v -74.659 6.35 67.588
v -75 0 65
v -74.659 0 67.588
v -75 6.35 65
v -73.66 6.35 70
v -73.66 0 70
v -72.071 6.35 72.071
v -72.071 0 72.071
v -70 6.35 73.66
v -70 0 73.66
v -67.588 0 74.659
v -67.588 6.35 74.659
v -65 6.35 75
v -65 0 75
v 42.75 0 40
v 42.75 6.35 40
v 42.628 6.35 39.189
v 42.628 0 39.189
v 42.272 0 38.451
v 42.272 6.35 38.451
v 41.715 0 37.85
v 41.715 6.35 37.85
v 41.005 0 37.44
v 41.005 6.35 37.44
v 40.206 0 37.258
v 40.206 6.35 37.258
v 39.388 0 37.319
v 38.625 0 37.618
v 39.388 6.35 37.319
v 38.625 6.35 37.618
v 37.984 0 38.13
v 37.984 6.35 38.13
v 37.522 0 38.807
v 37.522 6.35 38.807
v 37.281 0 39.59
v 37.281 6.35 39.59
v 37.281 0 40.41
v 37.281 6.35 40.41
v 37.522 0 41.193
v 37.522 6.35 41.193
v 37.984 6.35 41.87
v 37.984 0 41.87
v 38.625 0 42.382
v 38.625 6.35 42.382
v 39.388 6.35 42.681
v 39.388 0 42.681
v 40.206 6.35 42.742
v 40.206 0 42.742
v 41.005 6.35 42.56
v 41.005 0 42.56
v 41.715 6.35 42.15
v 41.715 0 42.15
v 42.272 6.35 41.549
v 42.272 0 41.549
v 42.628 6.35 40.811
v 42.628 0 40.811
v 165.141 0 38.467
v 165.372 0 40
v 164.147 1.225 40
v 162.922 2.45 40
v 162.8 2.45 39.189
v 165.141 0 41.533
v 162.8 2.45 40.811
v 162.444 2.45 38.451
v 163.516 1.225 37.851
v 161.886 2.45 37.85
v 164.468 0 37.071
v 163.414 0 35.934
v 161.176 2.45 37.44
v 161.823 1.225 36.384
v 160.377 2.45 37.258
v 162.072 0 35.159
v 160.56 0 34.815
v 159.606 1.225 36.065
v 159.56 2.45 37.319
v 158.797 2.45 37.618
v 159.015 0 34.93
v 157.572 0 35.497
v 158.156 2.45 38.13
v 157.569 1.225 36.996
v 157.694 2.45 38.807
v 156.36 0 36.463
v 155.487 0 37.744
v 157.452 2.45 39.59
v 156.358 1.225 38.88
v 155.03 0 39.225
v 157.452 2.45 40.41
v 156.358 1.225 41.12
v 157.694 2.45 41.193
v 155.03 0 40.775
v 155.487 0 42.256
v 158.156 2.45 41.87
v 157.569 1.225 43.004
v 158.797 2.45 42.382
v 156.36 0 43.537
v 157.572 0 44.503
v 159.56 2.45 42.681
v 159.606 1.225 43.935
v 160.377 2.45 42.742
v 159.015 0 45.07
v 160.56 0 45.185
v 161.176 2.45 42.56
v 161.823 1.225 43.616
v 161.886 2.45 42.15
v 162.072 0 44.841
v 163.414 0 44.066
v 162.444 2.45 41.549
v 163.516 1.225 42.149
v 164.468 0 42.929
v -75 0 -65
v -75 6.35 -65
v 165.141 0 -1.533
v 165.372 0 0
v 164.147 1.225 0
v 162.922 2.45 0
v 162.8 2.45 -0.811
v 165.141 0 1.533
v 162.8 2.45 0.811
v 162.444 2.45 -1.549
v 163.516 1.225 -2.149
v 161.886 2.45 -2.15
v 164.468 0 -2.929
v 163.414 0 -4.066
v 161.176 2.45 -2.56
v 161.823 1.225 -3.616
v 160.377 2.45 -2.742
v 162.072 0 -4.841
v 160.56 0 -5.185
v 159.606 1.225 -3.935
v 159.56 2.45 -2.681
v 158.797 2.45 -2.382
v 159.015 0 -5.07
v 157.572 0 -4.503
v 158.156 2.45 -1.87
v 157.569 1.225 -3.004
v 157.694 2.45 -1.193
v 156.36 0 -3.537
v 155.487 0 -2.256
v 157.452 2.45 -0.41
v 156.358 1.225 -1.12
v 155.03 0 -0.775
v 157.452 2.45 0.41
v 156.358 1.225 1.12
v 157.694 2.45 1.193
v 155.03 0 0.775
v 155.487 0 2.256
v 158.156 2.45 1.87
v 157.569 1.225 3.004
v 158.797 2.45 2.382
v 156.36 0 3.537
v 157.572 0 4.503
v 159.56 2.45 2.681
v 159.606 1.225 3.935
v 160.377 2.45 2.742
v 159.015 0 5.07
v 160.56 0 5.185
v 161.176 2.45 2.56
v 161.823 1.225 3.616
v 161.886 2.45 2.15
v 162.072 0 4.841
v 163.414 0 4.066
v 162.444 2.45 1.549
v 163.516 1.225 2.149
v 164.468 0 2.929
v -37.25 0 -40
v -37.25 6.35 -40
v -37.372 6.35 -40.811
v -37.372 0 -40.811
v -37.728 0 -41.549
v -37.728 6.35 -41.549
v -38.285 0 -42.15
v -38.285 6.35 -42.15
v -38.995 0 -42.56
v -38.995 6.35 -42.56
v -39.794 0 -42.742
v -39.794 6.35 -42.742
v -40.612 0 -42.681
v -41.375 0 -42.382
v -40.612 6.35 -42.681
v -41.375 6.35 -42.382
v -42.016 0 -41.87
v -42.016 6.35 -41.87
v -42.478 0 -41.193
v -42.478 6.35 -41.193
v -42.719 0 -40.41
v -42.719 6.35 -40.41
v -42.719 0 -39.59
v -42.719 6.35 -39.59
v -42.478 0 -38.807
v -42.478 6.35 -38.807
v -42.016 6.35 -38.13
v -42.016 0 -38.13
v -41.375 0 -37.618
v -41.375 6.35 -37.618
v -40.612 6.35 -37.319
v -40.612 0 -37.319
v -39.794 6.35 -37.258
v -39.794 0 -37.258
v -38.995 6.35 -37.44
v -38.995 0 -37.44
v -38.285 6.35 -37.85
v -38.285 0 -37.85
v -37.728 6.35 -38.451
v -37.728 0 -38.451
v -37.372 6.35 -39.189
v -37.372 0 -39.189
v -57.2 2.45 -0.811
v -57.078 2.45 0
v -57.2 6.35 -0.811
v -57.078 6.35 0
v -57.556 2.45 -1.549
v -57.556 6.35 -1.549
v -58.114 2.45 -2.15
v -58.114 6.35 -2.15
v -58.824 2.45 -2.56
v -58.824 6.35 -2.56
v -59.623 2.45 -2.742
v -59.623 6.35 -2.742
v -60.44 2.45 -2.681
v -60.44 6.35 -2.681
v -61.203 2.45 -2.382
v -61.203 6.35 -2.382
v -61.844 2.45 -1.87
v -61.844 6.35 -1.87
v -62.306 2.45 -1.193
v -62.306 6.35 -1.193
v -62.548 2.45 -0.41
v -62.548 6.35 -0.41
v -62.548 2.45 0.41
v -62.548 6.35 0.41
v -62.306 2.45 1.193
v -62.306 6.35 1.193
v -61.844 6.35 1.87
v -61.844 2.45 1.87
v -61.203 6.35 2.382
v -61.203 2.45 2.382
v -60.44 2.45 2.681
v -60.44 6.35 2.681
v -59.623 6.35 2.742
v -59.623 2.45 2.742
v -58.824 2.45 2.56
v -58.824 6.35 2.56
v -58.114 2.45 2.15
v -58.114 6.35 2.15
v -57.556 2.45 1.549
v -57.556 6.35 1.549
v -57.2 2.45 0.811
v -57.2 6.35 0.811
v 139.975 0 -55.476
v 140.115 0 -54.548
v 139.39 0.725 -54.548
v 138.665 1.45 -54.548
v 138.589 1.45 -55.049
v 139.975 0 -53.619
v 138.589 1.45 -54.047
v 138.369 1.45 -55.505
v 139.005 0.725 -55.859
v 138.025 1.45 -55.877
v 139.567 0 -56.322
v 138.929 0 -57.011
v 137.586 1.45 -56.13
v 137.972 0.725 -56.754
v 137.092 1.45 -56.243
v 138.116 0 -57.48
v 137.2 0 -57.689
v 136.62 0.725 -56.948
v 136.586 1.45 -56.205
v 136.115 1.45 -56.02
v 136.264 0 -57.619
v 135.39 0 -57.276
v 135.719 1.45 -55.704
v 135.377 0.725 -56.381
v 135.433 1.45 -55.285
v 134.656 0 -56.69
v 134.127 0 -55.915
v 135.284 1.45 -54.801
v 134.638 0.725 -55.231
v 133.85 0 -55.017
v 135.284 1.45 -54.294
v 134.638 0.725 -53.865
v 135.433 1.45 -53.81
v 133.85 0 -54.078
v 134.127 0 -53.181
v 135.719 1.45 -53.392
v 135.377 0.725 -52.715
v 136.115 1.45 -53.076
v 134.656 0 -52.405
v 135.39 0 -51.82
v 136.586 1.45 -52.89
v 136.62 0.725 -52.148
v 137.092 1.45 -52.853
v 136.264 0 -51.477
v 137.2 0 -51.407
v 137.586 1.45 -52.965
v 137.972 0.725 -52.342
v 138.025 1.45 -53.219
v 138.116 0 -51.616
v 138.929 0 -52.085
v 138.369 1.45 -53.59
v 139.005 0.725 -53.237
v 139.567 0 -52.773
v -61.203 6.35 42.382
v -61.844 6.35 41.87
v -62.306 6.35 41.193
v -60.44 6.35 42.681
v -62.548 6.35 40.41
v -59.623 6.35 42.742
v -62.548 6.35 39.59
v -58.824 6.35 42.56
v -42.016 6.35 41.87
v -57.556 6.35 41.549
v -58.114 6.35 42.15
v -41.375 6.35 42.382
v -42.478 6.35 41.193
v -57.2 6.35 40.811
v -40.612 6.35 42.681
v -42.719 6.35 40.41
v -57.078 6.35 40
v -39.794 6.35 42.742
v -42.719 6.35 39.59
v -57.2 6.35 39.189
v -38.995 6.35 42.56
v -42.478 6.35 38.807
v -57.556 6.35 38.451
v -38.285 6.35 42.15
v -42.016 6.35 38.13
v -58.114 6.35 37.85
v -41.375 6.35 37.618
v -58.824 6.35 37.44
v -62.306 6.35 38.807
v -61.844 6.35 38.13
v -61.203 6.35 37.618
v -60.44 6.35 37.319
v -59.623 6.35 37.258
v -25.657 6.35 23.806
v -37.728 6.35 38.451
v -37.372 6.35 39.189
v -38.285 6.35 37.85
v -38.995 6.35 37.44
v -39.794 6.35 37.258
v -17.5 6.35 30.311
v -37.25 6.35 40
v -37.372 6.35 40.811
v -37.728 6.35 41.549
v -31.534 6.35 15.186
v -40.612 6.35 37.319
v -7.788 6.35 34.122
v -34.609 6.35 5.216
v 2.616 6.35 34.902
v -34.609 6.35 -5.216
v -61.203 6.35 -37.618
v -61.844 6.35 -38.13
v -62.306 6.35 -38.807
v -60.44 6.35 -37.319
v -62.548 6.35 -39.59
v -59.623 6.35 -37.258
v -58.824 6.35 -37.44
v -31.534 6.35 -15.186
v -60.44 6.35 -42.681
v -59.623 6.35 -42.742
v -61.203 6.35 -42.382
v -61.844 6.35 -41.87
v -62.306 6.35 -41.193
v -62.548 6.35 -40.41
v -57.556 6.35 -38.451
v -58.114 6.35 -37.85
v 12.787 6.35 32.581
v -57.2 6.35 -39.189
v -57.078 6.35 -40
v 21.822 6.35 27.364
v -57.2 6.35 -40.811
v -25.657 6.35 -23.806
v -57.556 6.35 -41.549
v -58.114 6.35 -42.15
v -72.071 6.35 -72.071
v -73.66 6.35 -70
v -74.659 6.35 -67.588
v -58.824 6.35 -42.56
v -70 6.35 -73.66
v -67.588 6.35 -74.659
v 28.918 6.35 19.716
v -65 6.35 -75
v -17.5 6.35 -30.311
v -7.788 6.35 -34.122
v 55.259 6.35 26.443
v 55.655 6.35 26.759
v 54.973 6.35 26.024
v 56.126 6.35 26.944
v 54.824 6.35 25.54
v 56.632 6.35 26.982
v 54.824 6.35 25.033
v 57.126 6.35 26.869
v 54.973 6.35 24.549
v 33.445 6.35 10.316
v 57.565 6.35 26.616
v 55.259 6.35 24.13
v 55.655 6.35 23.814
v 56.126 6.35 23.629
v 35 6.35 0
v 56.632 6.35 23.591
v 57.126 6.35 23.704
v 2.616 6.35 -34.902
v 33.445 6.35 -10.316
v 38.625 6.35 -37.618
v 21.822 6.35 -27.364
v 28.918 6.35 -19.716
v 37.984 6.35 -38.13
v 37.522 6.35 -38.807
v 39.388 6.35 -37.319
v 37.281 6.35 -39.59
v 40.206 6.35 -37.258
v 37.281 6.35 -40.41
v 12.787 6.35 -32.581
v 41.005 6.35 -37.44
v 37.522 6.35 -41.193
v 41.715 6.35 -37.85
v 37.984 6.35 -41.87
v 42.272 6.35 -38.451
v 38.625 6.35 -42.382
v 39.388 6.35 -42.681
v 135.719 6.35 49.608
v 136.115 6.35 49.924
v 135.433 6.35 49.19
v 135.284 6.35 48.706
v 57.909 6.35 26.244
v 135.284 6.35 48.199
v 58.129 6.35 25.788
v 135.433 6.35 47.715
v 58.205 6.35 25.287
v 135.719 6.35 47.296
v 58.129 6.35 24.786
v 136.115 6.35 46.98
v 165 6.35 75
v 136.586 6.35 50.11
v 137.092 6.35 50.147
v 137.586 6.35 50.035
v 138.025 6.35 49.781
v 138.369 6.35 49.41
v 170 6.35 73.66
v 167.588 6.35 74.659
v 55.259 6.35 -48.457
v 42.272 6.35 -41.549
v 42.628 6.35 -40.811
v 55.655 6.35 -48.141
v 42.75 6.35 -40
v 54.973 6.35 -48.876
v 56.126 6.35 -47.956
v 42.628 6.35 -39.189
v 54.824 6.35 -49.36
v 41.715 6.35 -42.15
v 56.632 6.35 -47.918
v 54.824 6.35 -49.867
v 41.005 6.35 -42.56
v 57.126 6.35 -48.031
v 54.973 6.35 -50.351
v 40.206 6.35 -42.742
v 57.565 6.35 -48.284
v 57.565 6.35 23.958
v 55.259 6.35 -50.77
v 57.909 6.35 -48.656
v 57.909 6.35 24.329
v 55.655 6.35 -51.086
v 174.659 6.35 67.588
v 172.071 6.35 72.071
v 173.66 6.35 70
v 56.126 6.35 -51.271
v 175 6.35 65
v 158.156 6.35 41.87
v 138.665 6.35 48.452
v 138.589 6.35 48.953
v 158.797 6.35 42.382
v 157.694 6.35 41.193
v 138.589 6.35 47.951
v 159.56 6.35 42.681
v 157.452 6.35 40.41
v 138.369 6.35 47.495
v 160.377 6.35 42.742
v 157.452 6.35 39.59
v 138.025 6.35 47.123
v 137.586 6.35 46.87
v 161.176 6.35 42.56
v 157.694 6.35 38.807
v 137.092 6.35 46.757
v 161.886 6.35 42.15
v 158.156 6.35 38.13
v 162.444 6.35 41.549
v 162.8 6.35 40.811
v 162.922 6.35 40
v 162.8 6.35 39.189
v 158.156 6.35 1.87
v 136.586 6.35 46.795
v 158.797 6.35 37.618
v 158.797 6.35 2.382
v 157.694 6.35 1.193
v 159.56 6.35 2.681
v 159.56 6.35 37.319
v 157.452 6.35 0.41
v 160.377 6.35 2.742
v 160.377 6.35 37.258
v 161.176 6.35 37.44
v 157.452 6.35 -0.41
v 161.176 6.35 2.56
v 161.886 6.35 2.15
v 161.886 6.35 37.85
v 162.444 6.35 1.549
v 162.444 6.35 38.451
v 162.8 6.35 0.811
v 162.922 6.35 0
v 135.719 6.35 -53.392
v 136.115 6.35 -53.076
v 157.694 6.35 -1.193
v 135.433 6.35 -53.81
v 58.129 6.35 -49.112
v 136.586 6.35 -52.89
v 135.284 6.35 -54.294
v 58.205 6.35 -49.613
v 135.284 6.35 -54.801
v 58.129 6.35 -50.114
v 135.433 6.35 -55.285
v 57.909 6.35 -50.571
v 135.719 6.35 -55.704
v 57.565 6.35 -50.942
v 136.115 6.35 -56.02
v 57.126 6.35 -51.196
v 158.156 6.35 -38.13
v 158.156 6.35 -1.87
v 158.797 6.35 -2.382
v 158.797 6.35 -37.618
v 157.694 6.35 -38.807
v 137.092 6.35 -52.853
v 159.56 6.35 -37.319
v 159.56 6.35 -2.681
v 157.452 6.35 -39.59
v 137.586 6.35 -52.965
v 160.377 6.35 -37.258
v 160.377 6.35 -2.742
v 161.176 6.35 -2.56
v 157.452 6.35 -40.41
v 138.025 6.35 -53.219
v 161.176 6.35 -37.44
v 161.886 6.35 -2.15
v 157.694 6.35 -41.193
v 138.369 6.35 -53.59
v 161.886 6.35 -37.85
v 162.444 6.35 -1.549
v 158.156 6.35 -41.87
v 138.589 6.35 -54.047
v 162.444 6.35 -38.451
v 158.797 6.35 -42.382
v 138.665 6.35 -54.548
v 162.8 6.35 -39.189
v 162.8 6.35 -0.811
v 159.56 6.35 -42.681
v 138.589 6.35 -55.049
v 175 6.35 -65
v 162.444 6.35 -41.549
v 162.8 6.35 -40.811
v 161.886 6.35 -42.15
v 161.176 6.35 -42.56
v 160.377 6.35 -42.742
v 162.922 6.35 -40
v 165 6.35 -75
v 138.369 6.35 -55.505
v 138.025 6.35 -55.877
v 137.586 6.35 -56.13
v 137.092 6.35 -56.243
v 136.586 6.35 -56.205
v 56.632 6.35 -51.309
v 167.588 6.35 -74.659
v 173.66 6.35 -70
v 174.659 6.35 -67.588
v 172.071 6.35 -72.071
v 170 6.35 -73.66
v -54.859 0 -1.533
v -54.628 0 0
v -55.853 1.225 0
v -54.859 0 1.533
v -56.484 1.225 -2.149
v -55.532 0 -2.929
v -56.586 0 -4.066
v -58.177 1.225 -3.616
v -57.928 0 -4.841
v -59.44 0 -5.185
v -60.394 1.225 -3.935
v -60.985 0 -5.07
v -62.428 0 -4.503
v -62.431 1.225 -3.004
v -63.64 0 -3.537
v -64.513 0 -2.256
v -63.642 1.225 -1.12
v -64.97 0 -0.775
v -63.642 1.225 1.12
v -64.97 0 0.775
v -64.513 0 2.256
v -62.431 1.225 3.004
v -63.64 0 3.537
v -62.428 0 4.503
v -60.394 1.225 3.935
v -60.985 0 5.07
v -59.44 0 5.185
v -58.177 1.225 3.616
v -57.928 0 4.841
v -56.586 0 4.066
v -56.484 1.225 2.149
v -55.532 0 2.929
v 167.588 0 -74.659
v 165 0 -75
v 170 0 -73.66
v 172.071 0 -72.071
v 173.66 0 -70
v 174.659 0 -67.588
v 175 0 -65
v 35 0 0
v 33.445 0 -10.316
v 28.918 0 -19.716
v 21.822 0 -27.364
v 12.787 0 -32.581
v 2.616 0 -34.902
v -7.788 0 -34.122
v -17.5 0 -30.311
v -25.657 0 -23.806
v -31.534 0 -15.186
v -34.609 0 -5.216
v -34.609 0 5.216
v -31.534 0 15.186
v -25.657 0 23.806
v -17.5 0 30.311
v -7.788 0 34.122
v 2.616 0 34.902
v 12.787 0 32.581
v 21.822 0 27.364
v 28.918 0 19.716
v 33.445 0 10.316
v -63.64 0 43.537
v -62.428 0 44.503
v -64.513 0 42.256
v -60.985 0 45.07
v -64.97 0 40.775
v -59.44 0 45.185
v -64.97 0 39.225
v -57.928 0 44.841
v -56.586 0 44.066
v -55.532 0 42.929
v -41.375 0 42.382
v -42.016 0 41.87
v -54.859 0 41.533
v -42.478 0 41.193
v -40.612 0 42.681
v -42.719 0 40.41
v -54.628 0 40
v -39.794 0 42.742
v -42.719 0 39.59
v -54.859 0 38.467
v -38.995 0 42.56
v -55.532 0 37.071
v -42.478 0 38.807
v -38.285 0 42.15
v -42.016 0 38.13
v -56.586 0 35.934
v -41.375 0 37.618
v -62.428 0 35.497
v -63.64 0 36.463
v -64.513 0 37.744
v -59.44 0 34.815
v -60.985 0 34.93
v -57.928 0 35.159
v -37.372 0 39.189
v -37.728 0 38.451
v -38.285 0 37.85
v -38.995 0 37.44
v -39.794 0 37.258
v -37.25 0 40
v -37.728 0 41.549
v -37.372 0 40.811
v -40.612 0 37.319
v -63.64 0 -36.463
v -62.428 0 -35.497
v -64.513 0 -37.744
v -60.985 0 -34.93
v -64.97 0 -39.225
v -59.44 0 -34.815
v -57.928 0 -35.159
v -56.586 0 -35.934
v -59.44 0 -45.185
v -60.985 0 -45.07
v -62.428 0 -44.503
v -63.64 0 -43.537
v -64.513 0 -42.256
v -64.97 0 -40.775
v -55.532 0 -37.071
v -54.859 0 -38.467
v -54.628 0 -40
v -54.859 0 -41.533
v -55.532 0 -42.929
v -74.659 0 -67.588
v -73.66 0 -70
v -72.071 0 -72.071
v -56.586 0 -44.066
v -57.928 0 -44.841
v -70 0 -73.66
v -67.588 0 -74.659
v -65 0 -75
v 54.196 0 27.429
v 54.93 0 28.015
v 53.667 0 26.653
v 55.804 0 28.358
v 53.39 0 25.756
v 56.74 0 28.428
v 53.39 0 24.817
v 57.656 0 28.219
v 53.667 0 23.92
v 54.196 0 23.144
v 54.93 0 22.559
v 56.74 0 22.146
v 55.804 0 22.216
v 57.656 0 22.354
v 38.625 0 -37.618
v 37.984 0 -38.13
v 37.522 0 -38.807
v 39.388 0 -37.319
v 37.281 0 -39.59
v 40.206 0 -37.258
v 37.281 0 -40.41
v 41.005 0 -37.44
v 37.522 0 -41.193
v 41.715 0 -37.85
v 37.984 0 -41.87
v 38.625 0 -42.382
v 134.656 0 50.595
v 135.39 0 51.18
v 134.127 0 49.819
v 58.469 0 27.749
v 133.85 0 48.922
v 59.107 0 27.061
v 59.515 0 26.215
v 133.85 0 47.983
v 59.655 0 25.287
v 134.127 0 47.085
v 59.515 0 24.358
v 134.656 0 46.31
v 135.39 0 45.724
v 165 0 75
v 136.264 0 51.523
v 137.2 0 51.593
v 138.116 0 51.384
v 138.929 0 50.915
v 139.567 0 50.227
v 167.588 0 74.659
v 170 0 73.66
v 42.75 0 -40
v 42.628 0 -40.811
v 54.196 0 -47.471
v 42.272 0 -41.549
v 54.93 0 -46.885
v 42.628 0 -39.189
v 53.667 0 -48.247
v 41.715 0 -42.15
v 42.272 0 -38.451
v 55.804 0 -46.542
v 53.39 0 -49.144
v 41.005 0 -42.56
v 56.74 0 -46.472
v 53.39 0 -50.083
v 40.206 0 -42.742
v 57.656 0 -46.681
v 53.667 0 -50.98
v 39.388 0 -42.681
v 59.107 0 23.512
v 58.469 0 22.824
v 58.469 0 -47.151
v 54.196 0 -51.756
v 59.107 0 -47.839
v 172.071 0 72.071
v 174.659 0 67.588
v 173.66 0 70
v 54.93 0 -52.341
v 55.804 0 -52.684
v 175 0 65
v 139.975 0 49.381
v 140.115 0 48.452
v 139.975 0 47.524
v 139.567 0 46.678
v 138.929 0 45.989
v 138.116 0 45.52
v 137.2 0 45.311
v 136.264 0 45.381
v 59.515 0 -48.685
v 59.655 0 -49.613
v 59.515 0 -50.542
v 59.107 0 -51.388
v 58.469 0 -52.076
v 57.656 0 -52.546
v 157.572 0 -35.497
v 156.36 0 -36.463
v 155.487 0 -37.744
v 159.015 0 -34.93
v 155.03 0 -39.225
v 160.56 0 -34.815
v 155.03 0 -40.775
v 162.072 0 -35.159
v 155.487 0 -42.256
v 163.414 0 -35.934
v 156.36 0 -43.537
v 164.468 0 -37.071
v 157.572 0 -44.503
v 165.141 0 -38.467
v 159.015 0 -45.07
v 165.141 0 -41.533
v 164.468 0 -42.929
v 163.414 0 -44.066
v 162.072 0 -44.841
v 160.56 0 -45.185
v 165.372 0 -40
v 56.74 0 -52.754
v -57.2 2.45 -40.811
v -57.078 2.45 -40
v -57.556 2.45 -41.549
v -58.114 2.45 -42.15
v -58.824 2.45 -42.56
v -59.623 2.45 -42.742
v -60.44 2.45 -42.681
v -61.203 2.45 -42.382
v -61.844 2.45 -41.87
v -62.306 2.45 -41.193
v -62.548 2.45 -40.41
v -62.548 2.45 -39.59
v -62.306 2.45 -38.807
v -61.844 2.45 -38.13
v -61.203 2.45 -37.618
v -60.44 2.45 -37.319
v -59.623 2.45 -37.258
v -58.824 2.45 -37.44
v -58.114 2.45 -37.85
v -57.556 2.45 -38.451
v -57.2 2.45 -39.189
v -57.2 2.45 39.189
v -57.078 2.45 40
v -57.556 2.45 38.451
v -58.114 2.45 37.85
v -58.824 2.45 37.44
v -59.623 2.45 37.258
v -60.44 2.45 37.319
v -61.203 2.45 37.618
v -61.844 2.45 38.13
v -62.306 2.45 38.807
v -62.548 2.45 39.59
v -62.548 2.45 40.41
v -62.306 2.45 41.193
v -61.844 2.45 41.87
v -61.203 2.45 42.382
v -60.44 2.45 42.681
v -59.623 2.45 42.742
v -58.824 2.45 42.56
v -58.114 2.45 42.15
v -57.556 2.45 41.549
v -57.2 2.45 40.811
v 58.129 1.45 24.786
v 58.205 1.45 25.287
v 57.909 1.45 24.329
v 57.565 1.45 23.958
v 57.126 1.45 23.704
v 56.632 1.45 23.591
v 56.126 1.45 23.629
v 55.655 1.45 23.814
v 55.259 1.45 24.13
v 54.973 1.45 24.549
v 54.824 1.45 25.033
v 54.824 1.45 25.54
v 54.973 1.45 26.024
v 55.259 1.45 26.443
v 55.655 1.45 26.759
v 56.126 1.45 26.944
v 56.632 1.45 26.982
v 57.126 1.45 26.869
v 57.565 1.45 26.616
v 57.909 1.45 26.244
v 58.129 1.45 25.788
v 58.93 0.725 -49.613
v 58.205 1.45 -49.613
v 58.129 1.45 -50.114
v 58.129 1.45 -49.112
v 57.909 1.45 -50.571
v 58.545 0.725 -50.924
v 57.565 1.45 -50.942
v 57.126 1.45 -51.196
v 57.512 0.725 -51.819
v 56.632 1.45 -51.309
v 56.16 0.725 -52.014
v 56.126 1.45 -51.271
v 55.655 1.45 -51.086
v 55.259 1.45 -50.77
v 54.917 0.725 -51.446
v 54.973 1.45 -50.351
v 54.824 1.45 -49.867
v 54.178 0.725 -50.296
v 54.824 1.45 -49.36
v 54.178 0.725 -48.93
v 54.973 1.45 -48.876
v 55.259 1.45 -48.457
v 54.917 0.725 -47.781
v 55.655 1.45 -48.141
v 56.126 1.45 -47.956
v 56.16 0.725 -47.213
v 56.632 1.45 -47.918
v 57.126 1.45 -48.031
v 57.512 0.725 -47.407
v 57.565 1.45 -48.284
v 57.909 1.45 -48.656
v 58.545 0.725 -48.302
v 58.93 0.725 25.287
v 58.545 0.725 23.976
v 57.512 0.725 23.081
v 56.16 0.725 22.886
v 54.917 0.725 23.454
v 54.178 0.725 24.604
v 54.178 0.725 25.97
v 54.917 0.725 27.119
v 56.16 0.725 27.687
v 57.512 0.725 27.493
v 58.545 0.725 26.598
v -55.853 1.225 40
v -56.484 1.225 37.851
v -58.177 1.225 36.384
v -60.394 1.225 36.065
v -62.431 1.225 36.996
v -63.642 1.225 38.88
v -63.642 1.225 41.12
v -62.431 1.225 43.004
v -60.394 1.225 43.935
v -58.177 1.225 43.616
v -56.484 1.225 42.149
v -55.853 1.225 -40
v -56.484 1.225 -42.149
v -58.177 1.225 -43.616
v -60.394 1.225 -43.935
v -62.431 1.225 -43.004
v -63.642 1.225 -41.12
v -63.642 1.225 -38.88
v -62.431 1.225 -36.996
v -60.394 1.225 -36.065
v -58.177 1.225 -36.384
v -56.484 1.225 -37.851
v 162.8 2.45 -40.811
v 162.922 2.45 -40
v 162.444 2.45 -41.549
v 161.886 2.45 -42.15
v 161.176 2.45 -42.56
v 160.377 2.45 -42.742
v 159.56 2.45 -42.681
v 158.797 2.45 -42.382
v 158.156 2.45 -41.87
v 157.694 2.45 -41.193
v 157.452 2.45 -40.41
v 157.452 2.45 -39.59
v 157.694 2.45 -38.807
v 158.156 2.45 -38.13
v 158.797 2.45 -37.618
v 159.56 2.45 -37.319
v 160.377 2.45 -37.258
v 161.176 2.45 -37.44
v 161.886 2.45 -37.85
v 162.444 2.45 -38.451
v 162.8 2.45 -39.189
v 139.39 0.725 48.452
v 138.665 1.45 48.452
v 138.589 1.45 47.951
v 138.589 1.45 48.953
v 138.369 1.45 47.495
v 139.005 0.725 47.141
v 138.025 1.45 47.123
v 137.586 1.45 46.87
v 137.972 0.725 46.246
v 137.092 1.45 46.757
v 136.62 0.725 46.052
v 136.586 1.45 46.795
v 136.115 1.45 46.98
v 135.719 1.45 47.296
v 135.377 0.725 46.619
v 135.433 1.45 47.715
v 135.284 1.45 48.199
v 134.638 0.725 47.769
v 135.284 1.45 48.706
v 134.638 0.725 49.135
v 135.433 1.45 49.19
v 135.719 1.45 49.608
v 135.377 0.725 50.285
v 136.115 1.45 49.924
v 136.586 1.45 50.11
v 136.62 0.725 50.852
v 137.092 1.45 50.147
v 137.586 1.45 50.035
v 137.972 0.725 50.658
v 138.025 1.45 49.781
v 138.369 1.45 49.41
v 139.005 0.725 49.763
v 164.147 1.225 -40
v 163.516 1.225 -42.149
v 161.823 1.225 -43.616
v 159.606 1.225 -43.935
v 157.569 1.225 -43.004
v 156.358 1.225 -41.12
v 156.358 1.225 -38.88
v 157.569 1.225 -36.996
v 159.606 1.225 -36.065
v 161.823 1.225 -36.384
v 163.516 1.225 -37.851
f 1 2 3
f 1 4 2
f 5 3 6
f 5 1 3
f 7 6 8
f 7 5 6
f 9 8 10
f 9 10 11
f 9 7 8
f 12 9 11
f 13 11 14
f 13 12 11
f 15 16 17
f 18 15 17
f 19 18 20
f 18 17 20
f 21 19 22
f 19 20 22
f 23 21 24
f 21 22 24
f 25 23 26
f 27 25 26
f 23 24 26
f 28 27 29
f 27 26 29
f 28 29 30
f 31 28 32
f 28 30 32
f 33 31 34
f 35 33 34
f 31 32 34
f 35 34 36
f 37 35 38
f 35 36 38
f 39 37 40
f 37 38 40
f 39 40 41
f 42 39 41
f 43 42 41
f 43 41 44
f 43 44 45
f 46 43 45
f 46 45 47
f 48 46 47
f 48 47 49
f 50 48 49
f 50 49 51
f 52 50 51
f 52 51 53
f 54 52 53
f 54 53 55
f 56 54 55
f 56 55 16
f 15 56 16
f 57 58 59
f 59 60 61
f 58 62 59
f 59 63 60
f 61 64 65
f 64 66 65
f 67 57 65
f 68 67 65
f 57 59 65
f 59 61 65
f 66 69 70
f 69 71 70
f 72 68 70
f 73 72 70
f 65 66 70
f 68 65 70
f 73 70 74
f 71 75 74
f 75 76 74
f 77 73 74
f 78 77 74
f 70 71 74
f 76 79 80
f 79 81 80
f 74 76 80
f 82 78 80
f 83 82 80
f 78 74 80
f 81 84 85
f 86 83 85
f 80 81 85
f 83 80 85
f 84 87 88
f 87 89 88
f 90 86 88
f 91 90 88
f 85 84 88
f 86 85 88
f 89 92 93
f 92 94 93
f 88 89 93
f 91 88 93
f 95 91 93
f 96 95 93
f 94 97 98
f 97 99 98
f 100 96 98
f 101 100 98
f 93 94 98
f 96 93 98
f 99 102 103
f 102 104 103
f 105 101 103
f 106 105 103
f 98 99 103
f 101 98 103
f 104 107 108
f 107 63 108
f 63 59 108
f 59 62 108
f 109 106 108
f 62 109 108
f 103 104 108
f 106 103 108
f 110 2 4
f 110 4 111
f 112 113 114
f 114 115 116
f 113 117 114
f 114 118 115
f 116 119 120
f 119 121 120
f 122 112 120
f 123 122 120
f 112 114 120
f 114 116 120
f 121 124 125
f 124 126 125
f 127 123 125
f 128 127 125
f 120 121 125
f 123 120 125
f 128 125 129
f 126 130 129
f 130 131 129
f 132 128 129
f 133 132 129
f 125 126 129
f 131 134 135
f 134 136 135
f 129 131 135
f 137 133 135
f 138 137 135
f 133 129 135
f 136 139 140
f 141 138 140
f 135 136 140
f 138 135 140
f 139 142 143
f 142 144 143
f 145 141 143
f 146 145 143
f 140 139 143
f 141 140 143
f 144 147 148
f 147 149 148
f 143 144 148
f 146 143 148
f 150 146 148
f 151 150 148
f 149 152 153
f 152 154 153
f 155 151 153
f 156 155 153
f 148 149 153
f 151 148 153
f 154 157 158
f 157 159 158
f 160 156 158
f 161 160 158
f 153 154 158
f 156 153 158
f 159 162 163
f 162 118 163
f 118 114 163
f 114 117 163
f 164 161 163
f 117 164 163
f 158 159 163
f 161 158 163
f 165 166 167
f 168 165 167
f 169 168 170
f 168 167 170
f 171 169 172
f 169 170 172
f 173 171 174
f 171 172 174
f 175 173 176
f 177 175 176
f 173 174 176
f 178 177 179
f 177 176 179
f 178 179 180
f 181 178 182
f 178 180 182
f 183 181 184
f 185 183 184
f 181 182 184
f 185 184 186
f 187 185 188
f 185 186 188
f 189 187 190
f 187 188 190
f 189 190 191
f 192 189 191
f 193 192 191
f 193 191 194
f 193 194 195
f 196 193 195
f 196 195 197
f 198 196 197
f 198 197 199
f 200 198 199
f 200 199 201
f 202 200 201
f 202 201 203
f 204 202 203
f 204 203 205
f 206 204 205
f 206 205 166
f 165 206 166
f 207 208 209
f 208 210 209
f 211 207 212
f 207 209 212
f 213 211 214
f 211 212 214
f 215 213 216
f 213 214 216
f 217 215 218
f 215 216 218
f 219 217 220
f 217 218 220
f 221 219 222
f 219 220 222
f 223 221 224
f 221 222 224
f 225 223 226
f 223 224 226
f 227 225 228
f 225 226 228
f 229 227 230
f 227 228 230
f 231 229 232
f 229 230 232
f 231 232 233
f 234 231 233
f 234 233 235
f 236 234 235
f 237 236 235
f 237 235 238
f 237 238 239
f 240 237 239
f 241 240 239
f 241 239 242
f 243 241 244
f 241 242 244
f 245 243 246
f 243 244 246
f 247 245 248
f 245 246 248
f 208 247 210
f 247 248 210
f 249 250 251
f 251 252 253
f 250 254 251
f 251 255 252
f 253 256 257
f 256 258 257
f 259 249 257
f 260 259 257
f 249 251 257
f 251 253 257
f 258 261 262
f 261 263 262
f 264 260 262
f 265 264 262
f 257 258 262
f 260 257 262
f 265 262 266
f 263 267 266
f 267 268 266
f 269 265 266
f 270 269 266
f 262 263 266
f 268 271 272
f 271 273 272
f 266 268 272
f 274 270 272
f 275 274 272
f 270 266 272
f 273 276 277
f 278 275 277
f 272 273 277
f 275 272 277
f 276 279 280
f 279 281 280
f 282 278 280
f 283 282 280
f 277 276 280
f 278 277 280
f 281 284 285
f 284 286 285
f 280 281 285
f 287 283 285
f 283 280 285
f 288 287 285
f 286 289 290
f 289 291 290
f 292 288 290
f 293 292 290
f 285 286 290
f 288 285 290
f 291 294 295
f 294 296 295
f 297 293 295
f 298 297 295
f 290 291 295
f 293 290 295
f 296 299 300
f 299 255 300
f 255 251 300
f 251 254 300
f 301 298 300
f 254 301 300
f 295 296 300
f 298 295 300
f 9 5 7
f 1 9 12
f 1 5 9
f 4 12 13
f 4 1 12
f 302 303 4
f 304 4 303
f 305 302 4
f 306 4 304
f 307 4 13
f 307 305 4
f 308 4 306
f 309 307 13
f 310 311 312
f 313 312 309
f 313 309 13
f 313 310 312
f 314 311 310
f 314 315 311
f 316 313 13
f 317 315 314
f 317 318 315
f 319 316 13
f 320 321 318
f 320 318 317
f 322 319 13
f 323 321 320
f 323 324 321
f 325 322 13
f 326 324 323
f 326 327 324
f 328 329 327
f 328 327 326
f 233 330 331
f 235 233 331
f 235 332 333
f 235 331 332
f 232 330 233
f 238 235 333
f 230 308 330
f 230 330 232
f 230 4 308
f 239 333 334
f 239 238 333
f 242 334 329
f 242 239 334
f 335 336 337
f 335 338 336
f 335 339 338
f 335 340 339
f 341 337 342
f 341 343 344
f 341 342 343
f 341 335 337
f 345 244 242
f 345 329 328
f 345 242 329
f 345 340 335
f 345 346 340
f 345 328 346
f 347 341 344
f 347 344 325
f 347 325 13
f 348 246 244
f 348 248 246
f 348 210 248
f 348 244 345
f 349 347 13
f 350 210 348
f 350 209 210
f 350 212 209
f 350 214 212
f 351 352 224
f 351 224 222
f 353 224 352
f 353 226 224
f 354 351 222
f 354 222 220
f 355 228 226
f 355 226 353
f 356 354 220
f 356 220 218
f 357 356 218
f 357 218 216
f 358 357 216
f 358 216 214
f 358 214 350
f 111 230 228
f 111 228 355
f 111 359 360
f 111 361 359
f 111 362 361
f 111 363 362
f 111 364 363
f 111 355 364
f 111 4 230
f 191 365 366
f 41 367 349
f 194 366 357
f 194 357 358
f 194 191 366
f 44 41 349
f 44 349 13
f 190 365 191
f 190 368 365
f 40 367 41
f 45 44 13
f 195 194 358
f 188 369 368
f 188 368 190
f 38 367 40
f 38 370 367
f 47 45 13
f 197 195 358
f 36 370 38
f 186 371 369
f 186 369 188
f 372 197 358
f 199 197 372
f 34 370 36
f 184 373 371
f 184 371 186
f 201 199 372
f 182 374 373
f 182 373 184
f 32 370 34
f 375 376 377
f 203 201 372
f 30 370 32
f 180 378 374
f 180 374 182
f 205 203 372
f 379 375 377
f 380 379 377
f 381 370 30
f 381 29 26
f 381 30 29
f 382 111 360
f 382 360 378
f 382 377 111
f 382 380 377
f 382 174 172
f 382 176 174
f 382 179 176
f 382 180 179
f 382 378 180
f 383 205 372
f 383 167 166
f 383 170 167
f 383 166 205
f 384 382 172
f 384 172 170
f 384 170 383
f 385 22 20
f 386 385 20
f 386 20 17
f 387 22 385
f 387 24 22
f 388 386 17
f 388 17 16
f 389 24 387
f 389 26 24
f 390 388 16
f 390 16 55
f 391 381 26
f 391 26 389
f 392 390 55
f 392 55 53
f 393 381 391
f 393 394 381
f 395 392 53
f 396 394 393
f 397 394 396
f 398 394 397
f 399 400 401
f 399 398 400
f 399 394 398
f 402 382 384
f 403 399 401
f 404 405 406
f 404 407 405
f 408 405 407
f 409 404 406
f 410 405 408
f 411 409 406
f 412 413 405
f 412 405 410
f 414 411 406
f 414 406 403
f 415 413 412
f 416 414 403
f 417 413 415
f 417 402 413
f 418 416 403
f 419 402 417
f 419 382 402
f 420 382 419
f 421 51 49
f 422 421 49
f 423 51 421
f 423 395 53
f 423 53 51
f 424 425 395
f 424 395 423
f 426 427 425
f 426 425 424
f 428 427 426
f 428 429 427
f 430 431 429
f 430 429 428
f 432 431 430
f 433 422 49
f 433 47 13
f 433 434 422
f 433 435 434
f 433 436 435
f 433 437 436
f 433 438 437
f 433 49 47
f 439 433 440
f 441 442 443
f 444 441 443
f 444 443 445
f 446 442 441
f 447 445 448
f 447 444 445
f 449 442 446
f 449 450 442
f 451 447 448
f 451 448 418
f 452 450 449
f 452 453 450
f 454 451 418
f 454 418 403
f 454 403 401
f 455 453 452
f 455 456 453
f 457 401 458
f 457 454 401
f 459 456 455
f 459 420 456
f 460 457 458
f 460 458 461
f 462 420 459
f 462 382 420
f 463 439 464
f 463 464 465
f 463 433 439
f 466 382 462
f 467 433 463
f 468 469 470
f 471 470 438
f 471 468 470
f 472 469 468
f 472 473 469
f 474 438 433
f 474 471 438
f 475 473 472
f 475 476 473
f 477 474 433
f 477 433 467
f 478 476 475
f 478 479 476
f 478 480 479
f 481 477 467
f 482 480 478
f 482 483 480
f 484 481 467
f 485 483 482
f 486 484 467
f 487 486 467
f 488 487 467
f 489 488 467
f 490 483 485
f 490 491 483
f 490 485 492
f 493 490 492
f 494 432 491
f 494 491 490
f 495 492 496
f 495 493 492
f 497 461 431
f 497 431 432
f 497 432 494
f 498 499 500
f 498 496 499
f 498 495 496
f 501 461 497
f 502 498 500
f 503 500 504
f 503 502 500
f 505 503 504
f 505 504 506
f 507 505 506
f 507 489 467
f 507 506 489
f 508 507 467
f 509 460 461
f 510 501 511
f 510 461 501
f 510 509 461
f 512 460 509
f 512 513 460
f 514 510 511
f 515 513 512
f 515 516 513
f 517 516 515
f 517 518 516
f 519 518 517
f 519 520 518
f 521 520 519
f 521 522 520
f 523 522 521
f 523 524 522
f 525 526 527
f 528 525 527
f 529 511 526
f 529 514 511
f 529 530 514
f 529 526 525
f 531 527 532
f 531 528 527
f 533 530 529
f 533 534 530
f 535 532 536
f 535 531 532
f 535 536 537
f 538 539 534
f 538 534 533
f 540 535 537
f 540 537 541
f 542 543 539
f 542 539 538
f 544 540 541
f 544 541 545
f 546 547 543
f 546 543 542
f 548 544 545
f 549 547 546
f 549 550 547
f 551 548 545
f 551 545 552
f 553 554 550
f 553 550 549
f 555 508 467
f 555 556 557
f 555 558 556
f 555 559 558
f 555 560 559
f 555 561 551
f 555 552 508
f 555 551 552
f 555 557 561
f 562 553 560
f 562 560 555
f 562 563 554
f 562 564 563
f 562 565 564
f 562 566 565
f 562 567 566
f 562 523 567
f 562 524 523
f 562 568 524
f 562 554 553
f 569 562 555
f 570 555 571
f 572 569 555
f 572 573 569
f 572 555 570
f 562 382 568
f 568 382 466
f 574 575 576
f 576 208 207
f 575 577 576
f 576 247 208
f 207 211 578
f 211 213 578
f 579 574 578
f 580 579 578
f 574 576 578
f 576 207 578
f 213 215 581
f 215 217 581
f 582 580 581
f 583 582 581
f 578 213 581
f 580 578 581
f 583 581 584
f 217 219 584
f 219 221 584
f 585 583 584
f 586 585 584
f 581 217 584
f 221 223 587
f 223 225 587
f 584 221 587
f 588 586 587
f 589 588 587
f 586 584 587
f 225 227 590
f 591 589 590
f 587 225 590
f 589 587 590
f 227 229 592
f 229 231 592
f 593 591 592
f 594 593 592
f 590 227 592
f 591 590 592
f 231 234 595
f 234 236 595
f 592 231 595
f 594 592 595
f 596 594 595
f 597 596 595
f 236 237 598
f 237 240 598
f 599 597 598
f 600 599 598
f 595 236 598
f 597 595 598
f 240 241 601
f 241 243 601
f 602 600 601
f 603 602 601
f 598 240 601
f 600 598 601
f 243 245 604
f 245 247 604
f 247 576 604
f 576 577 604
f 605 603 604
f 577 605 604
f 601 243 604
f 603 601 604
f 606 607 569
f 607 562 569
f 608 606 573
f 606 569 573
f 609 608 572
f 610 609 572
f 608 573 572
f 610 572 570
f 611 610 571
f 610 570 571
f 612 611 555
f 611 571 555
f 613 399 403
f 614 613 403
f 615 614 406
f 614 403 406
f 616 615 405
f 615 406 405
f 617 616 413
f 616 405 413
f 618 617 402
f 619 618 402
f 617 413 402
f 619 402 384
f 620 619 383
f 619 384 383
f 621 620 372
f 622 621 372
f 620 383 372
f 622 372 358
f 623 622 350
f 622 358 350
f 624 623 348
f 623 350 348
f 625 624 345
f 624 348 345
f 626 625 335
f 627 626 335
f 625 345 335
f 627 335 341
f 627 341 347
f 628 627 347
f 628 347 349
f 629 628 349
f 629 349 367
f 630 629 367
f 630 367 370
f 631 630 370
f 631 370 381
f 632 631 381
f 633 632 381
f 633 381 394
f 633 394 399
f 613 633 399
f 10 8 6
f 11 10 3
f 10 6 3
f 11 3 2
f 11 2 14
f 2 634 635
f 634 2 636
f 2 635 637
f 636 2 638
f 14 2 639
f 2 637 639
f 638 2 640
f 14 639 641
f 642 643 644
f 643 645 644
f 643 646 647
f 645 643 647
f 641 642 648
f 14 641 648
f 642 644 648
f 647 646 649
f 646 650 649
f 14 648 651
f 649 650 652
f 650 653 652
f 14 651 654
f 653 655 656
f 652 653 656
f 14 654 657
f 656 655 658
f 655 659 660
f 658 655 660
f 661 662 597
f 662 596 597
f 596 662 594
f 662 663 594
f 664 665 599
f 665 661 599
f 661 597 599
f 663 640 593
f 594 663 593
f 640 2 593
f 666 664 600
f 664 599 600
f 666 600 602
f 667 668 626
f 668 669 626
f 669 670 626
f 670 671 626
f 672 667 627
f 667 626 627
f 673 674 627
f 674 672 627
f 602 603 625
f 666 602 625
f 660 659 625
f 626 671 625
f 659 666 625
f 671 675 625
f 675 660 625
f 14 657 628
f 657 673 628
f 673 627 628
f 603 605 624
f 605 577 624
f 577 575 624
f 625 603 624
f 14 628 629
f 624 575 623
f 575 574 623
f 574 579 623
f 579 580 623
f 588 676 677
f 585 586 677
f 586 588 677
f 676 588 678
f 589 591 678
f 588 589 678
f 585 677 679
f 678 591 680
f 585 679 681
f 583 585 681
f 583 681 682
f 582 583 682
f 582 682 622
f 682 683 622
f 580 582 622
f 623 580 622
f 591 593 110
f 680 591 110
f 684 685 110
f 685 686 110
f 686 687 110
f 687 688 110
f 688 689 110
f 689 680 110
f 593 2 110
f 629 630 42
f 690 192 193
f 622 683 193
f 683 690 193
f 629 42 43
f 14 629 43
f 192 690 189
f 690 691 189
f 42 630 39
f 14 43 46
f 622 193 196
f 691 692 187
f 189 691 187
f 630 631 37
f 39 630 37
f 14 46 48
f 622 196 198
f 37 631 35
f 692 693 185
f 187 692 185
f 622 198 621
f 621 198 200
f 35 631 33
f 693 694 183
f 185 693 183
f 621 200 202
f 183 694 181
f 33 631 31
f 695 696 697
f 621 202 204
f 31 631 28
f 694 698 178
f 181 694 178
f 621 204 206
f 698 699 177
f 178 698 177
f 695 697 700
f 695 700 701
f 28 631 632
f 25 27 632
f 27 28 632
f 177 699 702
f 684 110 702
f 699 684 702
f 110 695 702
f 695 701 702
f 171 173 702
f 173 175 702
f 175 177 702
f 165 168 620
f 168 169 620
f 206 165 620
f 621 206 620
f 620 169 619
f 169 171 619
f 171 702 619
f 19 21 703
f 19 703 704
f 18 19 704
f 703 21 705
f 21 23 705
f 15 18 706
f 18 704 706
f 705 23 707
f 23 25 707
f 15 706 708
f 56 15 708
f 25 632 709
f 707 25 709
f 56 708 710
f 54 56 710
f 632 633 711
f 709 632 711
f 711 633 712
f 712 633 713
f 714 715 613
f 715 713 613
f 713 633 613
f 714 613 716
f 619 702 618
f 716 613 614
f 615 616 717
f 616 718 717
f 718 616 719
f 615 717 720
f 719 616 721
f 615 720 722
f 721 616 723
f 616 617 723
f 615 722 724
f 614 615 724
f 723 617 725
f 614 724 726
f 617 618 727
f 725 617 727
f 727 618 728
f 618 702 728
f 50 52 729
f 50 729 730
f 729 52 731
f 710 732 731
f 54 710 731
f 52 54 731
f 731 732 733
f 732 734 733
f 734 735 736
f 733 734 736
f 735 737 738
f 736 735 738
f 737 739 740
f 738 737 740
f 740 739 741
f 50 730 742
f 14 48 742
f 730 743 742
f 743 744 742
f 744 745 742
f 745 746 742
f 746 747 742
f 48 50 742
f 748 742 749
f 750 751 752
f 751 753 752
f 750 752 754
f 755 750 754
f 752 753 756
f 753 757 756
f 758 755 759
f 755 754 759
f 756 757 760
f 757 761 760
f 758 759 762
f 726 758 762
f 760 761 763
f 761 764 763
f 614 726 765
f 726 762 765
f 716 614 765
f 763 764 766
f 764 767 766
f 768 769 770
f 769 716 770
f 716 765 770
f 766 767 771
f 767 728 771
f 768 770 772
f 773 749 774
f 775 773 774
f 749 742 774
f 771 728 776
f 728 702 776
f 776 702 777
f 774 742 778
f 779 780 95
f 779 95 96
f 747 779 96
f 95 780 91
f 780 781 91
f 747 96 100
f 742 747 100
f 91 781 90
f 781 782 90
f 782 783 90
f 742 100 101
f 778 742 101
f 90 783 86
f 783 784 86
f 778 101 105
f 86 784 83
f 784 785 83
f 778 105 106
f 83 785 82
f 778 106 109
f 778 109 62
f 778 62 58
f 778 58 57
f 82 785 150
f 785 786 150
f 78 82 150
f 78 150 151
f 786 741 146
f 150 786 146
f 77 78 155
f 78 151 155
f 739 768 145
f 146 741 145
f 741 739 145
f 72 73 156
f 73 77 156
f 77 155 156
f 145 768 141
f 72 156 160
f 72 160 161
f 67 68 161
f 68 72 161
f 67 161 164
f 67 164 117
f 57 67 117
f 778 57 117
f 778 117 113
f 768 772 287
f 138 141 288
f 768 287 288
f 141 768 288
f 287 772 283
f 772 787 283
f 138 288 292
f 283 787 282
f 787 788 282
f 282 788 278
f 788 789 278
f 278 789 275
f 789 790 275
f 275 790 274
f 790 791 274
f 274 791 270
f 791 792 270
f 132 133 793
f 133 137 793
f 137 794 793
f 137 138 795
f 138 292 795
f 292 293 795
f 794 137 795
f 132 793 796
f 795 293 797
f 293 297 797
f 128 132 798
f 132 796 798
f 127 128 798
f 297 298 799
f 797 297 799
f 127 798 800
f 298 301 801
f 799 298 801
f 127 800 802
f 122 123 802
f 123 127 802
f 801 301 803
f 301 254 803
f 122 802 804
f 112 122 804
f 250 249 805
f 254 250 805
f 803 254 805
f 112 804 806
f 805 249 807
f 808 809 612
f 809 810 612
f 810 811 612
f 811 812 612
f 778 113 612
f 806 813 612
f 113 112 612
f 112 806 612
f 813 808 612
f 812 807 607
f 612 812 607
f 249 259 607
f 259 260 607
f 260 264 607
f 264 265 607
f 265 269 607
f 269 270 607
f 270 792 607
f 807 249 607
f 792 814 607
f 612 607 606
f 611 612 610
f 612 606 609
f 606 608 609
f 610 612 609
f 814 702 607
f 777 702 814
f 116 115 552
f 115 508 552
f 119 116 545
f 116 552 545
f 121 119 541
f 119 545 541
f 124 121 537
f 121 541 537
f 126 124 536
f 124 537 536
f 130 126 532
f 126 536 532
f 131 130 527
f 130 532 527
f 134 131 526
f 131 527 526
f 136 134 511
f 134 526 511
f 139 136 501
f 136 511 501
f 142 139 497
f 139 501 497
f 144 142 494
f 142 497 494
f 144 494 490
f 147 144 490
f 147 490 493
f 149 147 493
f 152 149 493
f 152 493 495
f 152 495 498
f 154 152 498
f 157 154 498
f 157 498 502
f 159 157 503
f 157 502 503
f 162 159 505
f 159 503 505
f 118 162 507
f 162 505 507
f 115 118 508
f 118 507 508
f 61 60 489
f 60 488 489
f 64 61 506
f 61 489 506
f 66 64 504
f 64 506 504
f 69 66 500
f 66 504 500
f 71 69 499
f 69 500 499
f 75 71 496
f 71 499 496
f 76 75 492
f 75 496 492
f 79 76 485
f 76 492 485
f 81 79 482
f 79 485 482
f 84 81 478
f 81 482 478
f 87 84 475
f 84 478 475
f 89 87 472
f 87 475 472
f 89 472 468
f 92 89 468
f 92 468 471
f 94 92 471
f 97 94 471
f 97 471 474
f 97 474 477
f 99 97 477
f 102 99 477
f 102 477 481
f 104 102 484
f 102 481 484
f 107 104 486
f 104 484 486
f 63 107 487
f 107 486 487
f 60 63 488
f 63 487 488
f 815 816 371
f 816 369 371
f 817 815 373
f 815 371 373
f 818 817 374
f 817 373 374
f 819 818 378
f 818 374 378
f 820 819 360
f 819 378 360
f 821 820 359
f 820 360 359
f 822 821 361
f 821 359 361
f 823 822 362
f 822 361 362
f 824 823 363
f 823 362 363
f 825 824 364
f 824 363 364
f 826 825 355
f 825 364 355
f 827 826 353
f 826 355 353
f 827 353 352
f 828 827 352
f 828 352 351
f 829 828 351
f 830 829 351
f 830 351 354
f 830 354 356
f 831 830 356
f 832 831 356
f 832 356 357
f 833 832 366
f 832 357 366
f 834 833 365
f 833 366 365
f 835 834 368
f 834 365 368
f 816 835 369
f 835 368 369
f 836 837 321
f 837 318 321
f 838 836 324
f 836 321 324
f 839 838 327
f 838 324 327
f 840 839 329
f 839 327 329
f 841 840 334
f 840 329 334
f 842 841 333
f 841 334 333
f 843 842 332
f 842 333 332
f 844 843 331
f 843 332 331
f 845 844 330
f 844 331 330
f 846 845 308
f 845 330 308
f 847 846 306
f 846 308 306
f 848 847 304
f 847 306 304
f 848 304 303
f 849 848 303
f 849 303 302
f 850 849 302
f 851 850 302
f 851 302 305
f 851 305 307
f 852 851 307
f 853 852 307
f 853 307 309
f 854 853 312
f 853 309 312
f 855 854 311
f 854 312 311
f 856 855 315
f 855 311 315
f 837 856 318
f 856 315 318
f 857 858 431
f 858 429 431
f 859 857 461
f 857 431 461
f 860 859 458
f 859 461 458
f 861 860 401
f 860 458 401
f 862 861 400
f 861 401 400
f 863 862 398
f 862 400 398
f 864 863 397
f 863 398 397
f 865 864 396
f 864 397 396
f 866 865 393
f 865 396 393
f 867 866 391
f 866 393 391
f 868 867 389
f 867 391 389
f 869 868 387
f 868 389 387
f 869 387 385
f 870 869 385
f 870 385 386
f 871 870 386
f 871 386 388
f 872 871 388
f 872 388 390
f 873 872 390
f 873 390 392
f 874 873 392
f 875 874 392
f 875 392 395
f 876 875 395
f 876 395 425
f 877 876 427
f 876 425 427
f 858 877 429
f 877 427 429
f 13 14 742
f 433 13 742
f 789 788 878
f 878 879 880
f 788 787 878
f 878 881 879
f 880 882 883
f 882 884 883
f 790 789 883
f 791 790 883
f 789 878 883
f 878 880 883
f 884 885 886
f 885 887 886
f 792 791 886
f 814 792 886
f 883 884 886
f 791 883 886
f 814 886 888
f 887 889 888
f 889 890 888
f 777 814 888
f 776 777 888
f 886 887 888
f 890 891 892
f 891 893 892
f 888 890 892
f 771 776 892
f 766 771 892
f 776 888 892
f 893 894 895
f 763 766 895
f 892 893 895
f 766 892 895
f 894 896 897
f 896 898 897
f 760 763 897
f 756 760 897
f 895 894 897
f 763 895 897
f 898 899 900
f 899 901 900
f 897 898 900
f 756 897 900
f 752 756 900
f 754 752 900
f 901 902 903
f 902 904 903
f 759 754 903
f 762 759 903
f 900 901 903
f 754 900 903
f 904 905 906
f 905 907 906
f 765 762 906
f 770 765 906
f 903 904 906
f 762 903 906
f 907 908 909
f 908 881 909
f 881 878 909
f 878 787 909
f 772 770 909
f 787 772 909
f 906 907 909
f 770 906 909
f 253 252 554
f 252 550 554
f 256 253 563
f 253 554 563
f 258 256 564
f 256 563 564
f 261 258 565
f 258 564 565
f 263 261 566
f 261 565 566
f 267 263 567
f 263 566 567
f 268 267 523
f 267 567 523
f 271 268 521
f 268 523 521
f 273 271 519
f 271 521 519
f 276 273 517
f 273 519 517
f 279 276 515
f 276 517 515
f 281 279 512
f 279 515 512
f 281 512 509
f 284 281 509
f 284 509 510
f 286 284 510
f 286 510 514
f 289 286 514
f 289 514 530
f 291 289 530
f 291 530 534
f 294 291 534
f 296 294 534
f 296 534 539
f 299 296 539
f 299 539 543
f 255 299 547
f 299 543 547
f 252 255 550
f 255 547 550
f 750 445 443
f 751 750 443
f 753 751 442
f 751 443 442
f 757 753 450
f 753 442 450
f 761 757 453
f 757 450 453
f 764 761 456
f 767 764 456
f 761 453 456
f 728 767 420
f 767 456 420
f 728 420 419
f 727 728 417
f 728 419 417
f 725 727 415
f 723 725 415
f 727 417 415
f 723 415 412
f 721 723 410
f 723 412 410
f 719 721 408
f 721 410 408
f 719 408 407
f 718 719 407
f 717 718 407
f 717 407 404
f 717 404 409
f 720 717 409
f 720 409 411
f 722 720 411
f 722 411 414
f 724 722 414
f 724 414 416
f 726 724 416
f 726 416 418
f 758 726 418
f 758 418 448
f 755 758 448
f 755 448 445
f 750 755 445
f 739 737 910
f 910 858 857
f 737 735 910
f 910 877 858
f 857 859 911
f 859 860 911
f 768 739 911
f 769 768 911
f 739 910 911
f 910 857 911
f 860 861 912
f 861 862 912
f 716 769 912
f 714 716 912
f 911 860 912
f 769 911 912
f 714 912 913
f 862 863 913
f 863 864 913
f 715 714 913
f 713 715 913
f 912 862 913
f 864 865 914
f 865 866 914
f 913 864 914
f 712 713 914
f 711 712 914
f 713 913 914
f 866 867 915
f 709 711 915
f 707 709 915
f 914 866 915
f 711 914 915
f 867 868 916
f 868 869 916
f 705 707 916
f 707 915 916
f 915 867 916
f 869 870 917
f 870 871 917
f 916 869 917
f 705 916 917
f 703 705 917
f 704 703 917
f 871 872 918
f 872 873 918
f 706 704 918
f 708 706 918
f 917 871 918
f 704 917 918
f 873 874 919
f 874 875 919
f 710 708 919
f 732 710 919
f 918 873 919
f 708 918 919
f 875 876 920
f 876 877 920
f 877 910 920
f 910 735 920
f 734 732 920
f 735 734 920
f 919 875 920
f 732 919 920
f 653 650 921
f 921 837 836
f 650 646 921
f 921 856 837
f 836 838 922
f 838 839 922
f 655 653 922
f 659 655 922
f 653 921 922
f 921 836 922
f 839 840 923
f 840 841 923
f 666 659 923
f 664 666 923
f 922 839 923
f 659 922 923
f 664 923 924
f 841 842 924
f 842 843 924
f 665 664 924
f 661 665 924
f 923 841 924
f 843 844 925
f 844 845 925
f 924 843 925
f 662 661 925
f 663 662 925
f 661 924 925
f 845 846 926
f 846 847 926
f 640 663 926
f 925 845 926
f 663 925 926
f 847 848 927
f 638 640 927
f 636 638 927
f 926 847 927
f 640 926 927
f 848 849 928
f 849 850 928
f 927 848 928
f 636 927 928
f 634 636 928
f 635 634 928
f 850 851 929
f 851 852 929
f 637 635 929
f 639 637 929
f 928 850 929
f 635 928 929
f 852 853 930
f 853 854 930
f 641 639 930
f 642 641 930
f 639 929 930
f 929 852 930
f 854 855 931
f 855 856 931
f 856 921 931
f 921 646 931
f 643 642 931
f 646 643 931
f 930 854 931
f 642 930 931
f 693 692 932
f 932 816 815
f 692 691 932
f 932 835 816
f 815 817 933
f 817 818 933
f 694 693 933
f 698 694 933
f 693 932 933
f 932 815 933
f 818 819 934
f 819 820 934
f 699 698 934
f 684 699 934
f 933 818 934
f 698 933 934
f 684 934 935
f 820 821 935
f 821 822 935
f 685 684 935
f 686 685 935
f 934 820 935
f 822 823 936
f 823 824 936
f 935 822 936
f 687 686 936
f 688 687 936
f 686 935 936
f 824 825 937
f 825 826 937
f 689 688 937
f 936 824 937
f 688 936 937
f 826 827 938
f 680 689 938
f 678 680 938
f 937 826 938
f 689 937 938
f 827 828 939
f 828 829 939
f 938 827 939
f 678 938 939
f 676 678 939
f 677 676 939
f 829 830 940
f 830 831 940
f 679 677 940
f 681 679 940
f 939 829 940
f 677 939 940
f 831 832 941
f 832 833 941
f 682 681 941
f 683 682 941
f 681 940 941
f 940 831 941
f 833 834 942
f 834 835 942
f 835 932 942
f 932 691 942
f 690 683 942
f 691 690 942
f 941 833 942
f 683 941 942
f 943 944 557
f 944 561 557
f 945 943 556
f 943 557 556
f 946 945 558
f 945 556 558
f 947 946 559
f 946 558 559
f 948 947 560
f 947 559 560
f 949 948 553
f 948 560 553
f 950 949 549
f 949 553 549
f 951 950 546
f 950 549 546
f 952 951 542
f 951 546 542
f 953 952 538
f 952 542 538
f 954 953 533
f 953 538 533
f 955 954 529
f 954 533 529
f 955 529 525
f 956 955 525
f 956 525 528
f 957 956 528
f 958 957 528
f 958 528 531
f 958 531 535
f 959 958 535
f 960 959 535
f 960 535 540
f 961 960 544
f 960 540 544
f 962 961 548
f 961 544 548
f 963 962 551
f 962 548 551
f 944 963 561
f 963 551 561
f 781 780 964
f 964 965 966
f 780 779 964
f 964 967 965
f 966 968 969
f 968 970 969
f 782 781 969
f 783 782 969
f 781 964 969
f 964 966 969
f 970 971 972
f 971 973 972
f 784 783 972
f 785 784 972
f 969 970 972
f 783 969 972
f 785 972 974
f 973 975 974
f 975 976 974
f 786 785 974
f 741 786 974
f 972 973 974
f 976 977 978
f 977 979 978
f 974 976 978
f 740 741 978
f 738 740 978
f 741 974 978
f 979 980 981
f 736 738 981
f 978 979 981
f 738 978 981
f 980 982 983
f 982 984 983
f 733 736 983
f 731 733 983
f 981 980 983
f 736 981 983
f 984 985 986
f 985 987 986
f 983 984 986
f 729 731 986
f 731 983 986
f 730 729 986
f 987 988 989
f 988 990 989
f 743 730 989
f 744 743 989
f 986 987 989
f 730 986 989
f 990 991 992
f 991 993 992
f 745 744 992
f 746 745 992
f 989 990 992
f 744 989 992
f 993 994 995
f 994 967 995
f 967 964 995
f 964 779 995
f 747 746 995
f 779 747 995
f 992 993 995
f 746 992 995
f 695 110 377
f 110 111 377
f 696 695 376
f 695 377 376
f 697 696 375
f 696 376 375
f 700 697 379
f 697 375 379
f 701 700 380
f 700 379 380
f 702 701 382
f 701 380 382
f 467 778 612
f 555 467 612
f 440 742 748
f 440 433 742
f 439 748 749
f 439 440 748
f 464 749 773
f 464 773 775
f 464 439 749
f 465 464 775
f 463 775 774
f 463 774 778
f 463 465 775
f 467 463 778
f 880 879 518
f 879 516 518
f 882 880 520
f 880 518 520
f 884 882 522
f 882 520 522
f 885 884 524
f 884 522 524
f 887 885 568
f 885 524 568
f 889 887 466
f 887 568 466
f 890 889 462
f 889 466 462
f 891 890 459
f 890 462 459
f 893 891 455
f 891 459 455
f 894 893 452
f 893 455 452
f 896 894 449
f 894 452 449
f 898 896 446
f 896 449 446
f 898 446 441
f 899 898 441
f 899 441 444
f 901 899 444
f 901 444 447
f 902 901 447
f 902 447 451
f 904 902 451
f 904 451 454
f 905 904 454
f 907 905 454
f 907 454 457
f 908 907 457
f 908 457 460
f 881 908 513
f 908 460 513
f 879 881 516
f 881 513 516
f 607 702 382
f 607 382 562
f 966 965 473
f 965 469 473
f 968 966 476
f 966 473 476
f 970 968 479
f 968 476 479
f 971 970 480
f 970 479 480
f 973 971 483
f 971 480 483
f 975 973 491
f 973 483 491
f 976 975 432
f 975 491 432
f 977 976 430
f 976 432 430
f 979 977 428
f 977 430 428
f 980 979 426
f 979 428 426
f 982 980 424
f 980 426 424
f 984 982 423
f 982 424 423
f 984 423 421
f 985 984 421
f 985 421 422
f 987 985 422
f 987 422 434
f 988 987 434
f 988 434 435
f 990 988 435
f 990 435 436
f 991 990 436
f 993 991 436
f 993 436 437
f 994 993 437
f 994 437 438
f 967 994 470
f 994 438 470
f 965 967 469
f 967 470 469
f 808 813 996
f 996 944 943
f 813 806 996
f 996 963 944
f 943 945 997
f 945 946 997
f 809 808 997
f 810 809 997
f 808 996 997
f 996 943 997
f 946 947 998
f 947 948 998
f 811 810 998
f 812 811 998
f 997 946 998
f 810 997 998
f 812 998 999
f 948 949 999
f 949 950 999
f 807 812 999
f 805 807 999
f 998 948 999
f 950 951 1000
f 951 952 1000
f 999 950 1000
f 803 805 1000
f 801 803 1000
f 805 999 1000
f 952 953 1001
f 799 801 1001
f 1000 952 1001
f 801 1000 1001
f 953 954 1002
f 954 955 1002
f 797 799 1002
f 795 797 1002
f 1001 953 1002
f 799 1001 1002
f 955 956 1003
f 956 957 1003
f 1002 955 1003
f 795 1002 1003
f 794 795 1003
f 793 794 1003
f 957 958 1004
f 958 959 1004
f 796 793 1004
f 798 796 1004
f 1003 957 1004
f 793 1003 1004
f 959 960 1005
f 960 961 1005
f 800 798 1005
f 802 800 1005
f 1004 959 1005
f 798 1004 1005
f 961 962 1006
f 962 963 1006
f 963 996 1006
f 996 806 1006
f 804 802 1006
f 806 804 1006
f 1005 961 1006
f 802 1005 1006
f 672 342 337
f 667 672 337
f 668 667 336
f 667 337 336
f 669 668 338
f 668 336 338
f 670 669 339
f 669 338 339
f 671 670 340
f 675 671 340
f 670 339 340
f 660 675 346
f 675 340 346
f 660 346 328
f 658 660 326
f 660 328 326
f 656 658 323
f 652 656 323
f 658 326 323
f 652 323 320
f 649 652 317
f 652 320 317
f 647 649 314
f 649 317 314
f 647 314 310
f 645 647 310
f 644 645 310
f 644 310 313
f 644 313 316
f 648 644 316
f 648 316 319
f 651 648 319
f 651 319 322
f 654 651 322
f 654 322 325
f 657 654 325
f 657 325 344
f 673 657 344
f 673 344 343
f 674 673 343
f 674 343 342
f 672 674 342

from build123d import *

# Parameters (mm, degrees)
SKETCH1_W                                       = 250
SKETCH1_H                                       = 150
BOSS_EXTRUDE1_DEPTH                             = 6.35
SKETCH2_R                                       = 35
SKETCH2_R_2                                     = 2.75
CUT_EXTRUDE1_DEPTH                              = 7.35
FILLET1_R                                       = 10
CSK_FOR_M5_FLAT_HEAD_MACHINE_SCREW1_D           = 5.5
CSK_FOR_M5_FLAT_HEAD_MACHINE_SCREW1_CSINK_D     = 10.4
CSK_FOR_M5_FLAT_HEAD_MACHINE_SCREW1_CSINK_ANGLE = 90
CSK_FOR_M3_FLAT_HEAD_MACHINE_SCREW1_D           = 3.4
CSK_FOR_M3_FLAT_HEAD_MACHINE_SCREW1_CSINK_D     = 6.3
CSK_FOR_M3_FLAT_HEAD_MACHINE_SCREW1_CSINK_ANGLE = 90


with BuildPart() as part:
    # Sketch1 → Boss-Extrude1 (new body)
    with BuildSketch(Plane(origin=(0, 0, 0), x_dir=(1, 0, 0), z_dir=(0, 1, 0))):
        with Locations((50, 0)):
            Rectangle(SKETCH1_W, SKETCH1_H)
    extrude(amount=BOSS_EXTRUDE1_DEPTH)

    # Sketch2 → Cut-Extrude1 (cut, through all)
    with BuildSketch(Plane(origin=(0, 6.35, 0), x_dir=(1, 0, 0), z_dir=(0, 1, 0))):
        Circle(SKETCH2_R)
        with Locations((-40, 40)):
            Circle(SKETCH2_R_2)
        with Locations((40, 40)):
            Circle(SKETCH2_R_2)
        with Locations((-40, -40)):
            Circle(SKETCH2_R_2)
        with Locations((40, -40)):
            Circle(SKETCH2_R_2)
    extrude(amount=-CUT_EXTRUDE1_DEPTH, mode=Mode.SUBTRACT)

    # Fillet1
    fillet1_edges = [part.edges().sort_by_distance(p)[0] for p in [
        (-75, 3.175, -75),
        (175, 3.175, -75),
        (175, 3.175, 75),
        (-75, 3.175, 75),
    ]]
    fillet(fillet1_edges, radius=FILLET1_R)

    # CSK for M5 Flat Head Machine Screw1 (through all)
    with Locations(Plane(origin=(0, 0, 0), x_dir=(-1, 0, 0), z_dir=(0, -1, 0))):
        with Locations((59.828254494, 40), (59.828254494, 0), (59.828254494, -40), (-160.171745506, 40), (-160.171745506, 0), (-160.171745506, -40)):
            CounterSinkHole(CSK_FOR_M5_FLAT_HEAD_MACHINE_SCREW1_D / 2, CSK_FOR_M5_FLAT_HEAD_MACHINE_SCREW1_CSINK_D / 2, counter_sink_angle=CSK_FOR_M5_FLAT_HEAD_MACHINE_SCREW1_CSINK_ANGLE)

    # CSK for M3 Flat Head Machine Screw1 (through all)
    with Locations(Plane(origin=(0, 0, 0), x_dir=(-1, 0, 0), z_dir=(0, -1, 0))):
        with Locations((-136.964698881, -48.452177006), (-56.504698881, -25.286715777), (-56.504698881, 49.613284223), (-136.964698881, 54.547822994)):
            CounterSinkHole(CSK_FOR_M3_FLAT_HEAD_MACHINE_SCREW1_D / 2, CSK_FOR_M3_FLAT_HEAD_MACHINE_SCREW1_CSINK_D / 2, counter_sink_angle=CSK_FOR_M3_FLAT_HEAD_MACHINE_SCREW1_CSINK_ANGLE)


solid = part.part
